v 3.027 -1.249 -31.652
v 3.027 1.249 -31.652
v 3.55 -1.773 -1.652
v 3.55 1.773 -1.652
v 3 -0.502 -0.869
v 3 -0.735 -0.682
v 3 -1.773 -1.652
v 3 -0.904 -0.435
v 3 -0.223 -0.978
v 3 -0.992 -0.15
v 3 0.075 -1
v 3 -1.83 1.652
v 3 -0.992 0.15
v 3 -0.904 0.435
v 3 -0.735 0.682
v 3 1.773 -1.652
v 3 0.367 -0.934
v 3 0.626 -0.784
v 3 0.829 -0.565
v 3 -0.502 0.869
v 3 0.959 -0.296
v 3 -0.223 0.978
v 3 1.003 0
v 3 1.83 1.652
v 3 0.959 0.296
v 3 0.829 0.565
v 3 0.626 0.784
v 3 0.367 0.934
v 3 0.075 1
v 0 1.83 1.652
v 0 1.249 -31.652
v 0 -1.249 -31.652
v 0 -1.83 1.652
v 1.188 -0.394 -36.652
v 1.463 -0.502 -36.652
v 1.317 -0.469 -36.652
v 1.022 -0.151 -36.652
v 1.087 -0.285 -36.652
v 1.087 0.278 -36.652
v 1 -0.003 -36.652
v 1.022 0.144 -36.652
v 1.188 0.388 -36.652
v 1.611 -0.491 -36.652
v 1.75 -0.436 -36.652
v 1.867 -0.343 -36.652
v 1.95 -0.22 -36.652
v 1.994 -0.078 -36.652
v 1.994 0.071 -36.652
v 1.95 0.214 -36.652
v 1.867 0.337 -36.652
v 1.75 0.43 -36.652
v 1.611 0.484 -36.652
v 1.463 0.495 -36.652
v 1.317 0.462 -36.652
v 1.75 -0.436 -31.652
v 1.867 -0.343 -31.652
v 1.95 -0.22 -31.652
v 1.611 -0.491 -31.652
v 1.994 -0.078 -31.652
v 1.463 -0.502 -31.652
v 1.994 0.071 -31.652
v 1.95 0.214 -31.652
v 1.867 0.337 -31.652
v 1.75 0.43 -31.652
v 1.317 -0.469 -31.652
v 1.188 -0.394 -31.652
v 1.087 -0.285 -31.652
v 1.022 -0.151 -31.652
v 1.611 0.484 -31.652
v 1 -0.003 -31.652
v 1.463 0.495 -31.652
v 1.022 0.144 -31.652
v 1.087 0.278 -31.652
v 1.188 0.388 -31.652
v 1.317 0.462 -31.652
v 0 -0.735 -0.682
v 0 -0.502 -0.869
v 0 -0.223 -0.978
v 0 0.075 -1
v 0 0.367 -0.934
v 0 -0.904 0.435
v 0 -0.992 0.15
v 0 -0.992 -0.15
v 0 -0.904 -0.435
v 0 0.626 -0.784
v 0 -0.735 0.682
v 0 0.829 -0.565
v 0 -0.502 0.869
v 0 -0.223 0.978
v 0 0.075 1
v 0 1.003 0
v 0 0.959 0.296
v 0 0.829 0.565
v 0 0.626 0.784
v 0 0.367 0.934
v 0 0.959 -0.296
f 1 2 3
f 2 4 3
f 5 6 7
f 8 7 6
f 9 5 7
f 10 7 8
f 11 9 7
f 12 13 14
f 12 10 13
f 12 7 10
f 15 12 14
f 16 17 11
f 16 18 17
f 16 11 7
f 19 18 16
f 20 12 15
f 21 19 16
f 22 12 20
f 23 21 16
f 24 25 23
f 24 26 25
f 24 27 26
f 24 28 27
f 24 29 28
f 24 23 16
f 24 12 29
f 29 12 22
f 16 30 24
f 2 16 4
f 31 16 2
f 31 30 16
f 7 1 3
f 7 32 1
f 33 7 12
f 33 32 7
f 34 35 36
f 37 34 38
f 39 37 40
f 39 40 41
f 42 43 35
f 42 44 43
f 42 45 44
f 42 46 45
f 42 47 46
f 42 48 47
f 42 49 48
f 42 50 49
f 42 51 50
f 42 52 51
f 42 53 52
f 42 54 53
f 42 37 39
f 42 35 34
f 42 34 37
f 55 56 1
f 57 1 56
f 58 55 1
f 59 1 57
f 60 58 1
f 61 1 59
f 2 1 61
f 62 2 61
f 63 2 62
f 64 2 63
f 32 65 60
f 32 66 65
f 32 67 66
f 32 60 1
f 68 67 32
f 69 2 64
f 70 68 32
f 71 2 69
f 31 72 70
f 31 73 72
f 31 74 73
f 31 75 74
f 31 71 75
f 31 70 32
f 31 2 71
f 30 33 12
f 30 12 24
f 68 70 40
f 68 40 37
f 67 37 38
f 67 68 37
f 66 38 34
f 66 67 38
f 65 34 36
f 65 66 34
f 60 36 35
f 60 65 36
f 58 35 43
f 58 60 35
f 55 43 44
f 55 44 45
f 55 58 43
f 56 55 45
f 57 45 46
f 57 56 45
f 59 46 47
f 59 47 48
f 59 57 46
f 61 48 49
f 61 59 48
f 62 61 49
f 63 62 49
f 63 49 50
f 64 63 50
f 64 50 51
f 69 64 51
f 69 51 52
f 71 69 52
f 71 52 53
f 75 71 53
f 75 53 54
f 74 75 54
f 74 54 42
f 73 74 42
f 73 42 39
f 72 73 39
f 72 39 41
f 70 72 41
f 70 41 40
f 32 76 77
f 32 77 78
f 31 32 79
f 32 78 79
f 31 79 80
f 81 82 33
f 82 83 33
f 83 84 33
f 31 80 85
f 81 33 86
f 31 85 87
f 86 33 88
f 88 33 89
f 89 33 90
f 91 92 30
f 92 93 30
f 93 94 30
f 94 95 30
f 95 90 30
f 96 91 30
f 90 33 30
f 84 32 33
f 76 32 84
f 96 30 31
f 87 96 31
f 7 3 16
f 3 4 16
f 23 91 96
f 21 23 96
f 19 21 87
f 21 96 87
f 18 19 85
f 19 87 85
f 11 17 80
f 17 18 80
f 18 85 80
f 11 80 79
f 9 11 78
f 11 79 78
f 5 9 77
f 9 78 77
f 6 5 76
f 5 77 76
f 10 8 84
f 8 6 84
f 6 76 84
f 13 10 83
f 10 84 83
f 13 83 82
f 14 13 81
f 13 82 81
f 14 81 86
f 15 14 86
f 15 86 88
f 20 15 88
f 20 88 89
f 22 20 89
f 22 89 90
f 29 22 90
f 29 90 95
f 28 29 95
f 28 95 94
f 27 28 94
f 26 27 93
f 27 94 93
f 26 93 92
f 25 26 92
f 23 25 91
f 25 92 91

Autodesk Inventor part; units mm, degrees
ref_plane "YZ Plane" through (0, 0, 0) normal (1, 0, 0) x (0, 1, 0)
ref_plane "XZ Plane" through (0, 0, 0) normal (0, 1, 0) x (-1, 0, 0)
ref_plane "XY Plane" through (0, 0, 0) normal (0, 0, 1) x (1, 0, 0)
sketch "Sketch1" plane through (0, 0, 0) normal (1, 0, 0) x (0, 1, 0)
  circle A0 centre (0, 0) radius 1.0033
  line L0 (-1.249071, 1.652114) -> (1.249071, 1.652114)
  line L1 (1.249071, 1.652114) -> (1.249071, -1.652114)
  line L2 (1.249071, -1.652114) -> (-1.249071, -1.652114)
  line L3 (-1.249071, -1.652114) -> (-1.249071, 1.652114)
  line L4 (-1.249071, 1.652114) -> (1.249071, -1.652114) construction
  line L5 (1.249071, 1.652114) -> (-1.249071, -1.652114) construction
  dimension "d0" = 2.0066
  dimension "d1" = 37.0909
  dimension "d2" = 2.49814
extrude "Extrusion1" add sketch "Sketch1" along normal blind 3
sketch "Sketch2" plane through (0, -1.249071, -1.652114) normal (0, 0, -1) x (-1, 0, 0)
  line L0 (0, 0) -> (0, 2.498142)
  line L1 (-3.026642, 0) -> (0, 0)
  line L2 (0, 0) -> (0, 2.498142)
  line L3 (0, 2.498142) -> (-3.026642, 2.498142)
  line L4 (-3.026642, 2.498142) -> (-3.026642, 0)
  line L5 (-3.026642, 0) -> (0, 2.498142) construction
  line L6 (0, 0) -> (-3.026642, 2.498142) construction
  point P0 (0, 1.249071)
  point P1 (-1.513321, 1.249071)
  dimension "d5" = 50.4643
  dimension "d6" = 3.02664
extrude "Extrusion2" add sketch "Sketch2" along normal blind 30
draft "FaceDraft1" angle 1 pull direction (0, 0, -1) faces at (1, -1.249071, -10.550705) (3.026642, 0.416357, -21.652114) (1, 1.249071, -10.550705) fixed edges at (1.513321, -1.249071, -31.652114) (3.026642, 0, -31.652114) (1.513321, 1.249071, -31.652114)
sketch "Sketch3" plane through (0, -1.249071, -31.652114) normal (0, 0, -1) x (-1, 0, 0)
  line L0 (0, 2.491731) -> (-3, -0.000251)
  line L1 (-3, 3.079469) -> (-3, -0.581327)
  line L2 (-3.026642, 0) -> (0, 0)
  line L3 (-3, 2.491731) -> (0, 0)
  circle A0 centre (-1.5, 1.245866) radius 0.5
  point P0 (0, 1.249071)
  dimension "d10" = 1
extrude "Extrusion3" add sketch "Sketch3" along normal blind 5 contours A0 L3 L0 | L0 L3 A0 | L3 A0 L0 | L0 A0 L3
properties part number "bout tournant"
